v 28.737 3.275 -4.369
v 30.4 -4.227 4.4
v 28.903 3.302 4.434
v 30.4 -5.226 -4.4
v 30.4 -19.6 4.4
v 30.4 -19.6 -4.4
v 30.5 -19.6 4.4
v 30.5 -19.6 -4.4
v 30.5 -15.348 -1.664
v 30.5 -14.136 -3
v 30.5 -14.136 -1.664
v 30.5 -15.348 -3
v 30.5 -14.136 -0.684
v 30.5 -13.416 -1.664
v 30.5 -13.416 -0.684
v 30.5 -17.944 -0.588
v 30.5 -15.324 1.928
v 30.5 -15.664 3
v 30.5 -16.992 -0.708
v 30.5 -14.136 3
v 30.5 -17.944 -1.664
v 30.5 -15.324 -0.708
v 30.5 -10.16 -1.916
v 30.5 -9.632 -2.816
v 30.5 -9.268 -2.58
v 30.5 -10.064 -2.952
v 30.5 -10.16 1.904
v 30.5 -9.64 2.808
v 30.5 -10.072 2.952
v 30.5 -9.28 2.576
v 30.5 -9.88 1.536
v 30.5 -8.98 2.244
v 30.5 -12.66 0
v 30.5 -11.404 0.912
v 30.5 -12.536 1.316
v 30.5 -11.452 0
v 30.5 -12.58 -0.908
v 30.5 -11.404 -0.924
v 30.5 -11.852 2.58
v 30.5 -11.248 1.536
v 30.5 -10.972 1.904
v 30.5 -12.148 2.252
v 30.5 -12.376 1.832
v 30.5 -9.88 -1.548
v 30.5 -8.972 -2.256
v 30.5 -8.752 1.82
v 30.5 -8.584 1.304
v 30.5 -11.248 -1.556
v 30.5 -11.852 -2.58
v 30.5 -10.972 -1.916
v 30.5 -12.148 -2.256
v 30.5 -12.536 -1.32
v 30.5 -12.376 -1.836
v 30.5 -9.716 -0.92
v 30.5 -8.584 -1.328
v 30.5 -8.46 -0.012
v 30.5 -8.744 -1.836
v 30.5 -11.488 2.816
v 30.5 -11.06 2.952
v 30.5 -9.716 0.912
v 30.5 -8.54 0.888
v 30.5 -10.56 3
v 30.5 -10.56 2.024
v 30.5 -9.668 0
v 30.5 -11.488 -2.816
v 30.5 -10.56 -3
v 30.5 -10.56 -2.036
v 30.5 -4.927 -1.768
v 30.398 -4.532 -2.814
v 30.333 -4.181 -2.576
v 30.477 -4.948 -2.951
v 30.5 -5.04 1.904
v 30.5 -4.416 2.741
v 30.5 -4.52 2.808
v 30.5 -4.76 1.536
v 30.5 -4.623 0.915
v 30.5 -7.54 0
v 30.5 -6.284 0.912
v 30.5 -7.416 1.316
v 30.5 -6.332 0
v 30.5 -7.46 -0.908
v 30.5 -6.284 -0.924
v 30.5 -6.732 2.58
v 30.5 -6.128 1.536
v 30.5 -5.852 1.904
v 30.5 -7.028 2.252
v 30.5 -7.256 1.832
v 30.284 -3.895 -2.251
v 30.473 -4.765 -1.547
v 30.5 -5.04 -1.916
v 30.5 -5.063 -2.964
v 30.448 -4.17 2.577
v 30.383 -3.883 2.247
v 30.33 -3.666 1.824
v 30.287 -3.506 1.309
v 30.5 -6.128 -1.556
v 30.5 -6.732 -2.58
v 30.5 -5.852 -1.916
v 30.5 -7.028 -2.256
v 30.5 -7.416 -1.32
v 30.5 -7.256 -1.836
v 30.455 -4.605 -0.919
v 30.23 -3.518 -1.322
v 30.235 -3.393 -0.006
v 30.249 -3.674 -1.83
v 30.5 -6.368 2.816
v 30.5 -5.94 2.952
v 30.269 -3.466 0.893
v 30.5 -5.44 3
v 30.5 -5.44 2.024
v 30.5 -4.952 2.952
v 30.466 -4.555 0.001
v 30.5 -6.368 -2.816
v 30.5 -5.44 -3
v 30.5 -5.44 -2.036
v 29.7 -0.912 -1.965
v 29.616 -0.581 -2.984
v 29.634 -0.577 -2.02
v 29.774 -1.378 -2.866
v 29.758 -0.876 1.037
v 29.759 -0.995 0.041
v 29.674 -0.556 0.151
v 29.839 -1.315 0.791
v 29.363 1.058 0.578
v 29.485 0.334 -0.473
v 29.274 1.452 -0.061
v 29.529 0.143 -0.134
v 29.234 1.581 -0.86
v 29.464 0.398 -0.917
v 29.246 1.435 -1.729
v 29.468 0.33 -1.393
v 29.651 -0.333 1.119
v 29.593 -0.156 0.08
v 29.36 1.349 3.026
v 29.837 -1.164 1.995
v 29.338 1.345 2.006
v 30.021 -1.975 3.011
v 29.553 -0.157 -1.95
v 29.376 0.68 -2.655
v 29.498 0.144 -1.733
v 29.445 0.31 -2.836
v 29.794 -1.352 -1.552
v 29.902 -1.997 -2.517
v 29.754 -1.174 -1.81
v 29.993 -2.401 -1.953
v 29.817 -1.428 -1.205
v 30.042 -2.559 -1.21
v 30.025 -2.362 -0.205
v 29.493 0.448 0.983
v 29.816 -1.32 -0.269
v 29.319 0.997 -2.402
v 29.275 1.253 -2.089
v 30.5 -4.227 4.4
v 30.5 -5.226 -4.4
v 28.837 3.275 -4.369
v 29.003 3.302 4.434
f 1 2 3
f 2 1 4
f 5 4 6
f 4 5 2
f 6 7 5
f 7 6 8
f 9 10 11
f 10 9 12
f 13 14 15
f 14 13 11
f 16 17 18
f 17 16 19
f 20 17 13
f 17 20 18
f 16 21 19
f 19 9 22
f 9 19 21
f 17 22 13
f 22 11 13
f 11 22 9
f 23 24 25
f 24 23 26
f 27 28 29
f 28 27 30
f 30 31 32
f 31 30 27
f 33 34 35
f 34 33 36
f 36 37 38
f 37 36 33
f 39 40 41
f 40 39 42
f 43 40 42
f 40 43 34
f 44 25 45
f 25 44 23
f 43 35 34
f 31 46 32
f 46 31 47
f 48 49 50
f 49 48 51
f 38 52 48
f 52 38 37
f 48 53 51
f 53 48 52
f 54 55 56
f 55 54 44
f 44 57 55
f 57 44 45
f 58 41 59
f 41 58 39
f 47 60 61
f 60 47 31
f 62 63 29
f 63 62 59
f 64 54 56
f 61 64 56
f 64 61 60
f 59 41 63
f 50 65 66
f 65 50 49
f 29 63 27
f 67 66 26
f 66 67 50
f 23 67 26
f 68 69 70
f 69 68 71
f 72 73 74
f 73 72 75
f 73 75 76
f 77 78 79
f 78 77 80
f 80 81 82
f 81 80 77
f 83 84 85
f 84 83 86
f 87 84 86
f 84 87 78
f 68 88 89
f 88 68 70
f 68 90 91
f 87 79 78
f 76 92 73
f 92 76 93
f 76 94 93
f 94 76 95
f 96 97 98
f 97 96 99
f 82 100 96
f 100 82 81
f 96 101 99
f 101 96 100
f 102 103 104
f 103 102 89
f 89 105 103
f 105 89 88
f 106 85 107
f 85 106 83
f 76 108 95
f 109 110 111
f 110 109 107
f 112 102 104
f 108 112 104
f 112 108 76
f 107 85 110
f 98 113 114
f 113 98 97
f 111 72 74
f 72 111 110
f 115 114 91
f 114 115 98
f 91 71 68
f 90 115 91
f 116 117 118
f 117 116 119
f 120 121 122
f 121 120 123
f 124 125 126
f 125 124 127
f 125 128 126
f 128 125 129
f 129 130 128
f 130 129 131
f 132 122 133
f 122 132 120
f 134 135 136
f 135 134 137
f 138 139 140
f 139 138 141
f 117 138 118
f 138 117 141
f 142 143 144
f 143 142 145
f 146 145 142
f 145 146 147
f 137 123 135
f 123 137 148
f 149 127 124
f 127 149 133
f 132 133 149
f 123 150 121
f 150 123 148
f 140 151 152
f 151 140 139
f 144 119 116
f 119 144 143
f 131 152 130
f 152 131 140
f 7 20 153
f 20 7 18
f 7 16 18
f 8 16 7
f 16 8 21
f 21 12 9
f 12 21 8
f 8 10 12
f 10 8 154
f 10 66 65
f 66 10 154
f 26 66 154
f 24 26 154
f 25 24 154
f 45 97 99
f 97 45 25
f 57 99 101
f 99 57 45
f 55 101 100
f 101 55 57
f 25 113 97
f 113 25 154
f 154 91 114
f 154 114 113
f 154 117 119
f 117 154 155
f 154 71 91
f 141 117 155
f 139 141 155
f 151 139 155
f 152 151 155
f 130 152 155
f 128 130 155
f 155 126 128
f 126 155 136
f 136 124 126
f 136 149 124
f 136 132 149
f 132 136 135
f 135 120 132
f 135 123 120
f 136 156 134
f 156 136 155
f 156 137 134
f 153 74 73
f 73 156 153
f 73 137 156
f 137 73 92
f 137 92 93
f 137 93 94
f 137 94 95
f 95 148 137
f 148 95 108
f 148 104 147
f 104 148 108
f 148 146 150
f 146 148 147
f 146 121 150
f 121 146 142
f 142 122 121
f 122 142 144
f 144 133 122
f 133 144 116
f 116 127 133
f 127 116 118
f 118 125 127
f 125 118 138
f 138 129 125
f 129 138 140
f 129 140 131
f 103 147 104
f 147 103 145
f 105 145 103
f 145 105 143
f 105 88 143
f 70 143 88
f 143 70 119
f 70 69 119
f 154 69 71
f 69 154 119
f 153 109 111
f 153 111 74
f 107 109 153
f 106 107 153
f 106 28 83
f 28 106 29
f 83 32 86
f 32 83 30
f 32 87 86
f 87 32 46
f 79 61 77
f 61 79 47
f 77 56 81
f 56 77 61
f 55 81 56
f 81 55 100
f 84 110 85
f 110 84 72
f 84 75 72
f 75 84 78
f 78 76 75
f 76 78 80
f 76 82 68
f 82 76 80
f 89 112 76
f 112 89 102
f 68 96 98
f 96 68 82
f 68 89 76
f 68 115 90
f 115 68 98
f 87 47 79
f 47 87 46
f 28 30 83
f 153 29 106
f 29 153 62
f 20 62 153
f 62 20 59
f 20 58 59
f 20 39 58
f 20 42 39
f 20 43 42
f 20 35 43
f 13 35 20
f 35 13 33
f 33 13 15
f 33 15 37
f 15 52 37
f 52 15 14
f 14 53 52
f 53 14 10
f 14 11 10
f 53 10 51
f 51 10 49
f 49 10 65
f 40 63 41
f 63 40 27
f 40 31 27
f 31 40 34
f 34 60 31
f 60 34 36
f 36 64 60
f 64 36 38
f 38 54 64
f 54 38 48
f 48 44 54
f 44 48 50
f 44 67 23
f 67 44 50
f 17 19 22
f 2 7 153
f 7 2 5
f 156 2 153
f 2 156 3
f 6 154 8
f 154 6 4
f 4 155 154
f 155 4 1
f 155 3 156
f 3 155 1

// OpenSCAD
use <../lib.scad>
function ldraw_lib__194175bc01() = [
// 0 Sticker  1.1 x  2.9 with White "4005" on Transparent Background (Formed for Boat Stern Left Side)
// 0 Name: 194175bc01.dat
// 0 Author: Takeshi Takahashi [RainbowDolphin]
// 0 !LDRAW_ORG Part UPDATE 2022-06
// 0 !LICENSE Licensed under CC BY 2.0 and CC BY 4.0 : see CAreadme.txt
// 
// 0 BFC CERTIFY CCW
  [0,"BFC","CERTIFY"],
  [0,"BFC","CCW"],
// 
// 0 !KEYWORDS Bricklink 4005stk01, Brickowl 946320, Rebrickable 194175, Set 4005
// 0 !KEYWORDS Tug boat
// 
// 0 !HISTORY 2022-12-20 [PTadmin] Official Update 2022-06
// 
// 
// 4 16 71.8435 10.9226 8.188 76 11 -13.0658 76 -11 -10.5677 72.2585 -11.0845 8.256
  [4,16,71.8435,10.9226,8.188,76,11,-13.0658,76,-11,-10.5677,72.2585,-11.0845,8.256],
// 4 16 76 -11 -49 76 -11 -10.5677 76 11 -13.0658 76 11 -49
  [4,16,76,-11,-49,76,-11,-10.5677,76,11,-13.0658,76,11,-49],
// 4 16 76.25 11 -49 76.25 -11 -49 76 -11 -49 76 11 -49
  [4,16,76.25,11,-49,76.25,-11,-49,76,-11,-49,76,11,-49],
// 0 BFC NOCLIP
  [0,"BFC","NOCLIP"],
// 4 15 76.25 7.5 -38.37 76.25 7.5 -35.34 76.25 4.16 -35.34 76.25 4.16 -38.37
  [4,15,76.25,7.5,-38.37,76.25,7.5,-35.34,76.25,4.16,-35.34,76.25,4.16,-38.37],
// 4 15 76.25 1.71 -35.34 76.25 4.16 -35.34 76.25 4.16 -33.54 76.25 1.71 -33.54
  [4,15,76.25,1.71,-35.34,76.25,4.16,-35.34,76.25,4.16,-33.54,76.25,1.71,-33.54],
// 4 15 76.25 1.77 -42.48 76.25 -4.82 -38.31 76.25 -7.5 -39.16 76.25 1.47 -44.86
  [4,15,76.25,1.77,-42.48,76.25,-4.82,-38.31,76.25,-7.5,-39.16,76.25,1.47,-44.86],
// 4 15 76.25 -7.5 -35.34 76.25 -7.5 -39.16 76.25 -4.82 -38.31 76.25 1.71 -35.34
  [4,15,76.25,-7.5,-35.34,76.25,-7.5,-39.16,76.25,-4.82,-38.31,76.25,1.71,-35.34],
// 3 15 76.25 1.47 -44.86 76.25 4.16 -44.86 76.25 1.77 -42.48
  [3,15,76.25,1.47,-44.86,76.25,4.16,-44.86,76.25,1.77,-42.48],
// 4 15 76.25 1.77 -38.31 76.25 1.77 -42.48 76.25 4.16 -44.86 76.25 4.16 -38.37
  [4,15,76.25,1.77,-38.31,76.25,1.77,-42.48,76.25,4.16,-44.86,76.25,4.16,-38.37],
// 3 15 76.25 -4.82 -38.31 76.25 1.77 -38.31 76.25 1.71 -35.34
  [3,15,76.25,-4.82,-38.31,76.25,1.77,-38.31,76.25,1.71,-35.34],
// 4 15 76.25 4.16 -38.37 76.25 4.16 -35.34 76.25 1.71 -35.34 76.25 1.77 -38.31
  [4,15,76.25,4.16,-38.37,76.25,4.16,-35.34,76.25,1.71,-35.34,76.25,1.77,-38.31],
// 4 15 76.25 6.45 -23.17 76.25 4.79 -25.4 76.25 7.38 -25.16 76.25 7.04 -24.08
  [4,15,76.25,6.45,-23.17,76.25,4.79,-25.4,76.25,7.38,-25.16,76.25,7.04,-24.08],
// 4 15 76.25 -7.38 -25.18 76.25 -4.76 -25.4 76.25 -6.44 -23.2 76.25 -7.02 -24.1
  [4,15,76.25,-7.38,-25.18,76.25,-4.76,-25.4,76.25,-6.44,-23.2,76.25,-7.02,-24.1],
// 4 15 76.25 -5.61 -22.45 76.25 -6.44 -23.2 76.25 -4.76 -25.4 76.25 -3.84 -24.7
  [4,15,76.25,-5.61,-22.45,76.25,-6.44,-23.2,76.25,-4.76,-25.4,76.25,-3.84,-24.7],
// 4 15 76.25 -3.29 -31.34 76.25 0 -31.65 76.25 0 -28.63 76.25 -2.28 -28.51
  [4,15,76.25,-3.29,-31.34,76.25,0,-31.65,76.25,0,-28.63,76.25,-2.28,-28.51],
// 4 15 76.25 0 -31.65 76.25 2.27 -31.45 76.25 2.31 -28.51 76.25 0 -28.63
  [4,15,76.25,0,-31.65,76.25,2.27,-31.45,76.25,2.31,-28.51,76.25,0,-28.63],
// 4 15 76.25 -4.76 -27.43 76.25 -6.45 -29.63 76.25 -5.63 -30.37 76.25 -3.84 -28.119
  [4,15,76.25,-4.76,-27.43,76.25,-6.45,-29.63,76.25,-5.63,-30.37,76.25,-3.84,-28.119],
// 4 15 76.25 -3.84 -28.119 76.25 -5.63 -30.37 76.25 -4.58 -30.94 76.25 -2.28 -28.51
  [4,15,76.25,-3.84,-28.119,76.25,-5.63,-30.37,76.25,-4.58,-30.94,76.25,-2.28,-28.51],
// 4 15 76.25 4.79 -25.4 76.25 6.45 -23.17 76.25 5.64 -22.43 76.25 3.87 -24.7
  [4,15,76.25,4.79,-25.4,76.25,6.45,-23.17,76.25,5.64,-22.43,76.25,3.87,-24.7],
// 3 15 76.25 -4.58 -30.94 76.25 -3.29 -31.34 76.25 -2.28 -28.51
  [3,15,76.25,-4.58,-30.94,76.25,-3.29,-31.34,76.25,-2.28,-28.51],
// 4 15 76.25 -3.26 -21.46 76.25 -4.55 -21.88 76.25 -5.61 -22.45 76.25 -3.84 -24.7
  [4,15,76.25,-3.26,-21.46,76.25,-4.55,-21.88,76.25,-5.61,-22.45,76.25,-3.84,-24.7],
// 4 15 76.25 4.79 -27.43 76.25 3.89 -28.119 76.25 5.64 -30.37 76.25 6.45 -29.63
  [4,15,76.25,4.79,-27.43,76.25,3.89,-28.119,76.25,5.64,-30.37,76.25,6.45,-29.63],
// 4 15 76.25 2.27 -31.45 76.25 3.3 -31.34 76.25 3.89 -28.119 76.25 2.31 -28.51
  [4,15,76.25,2.27,-31.45,76.25,3.3,-31.34,76.25,3.89,-28.119,76.25,2.31,-28.51],
// 4 15 76.25 3.3 -31.34 76.25 4.59 -30.94 76.25 5.64 -30.37 76.25 3.89 -28.119
  [4,15,76.25,3.3,-31.34,76.25,4.59,-30.94,76.25,5.64,-30.37,76.25,3.89,-28.119],
// 4 15 76.25 .03 -21.15 76.25 2.3 -24.29 76.25 3.87 -24.7 76.25 3.32 -21.46
  [4,15,76.25,.03,-21.15,76.25,2.3,-24.29,76.25,3.87,-24.7,76.25,3.32,-21.46],
// 4 15 76.25 5.64 -22.43 76.25 4.59 -21.86 76.25 3.32 -21.46 76.25 3.87 -24.7
  [4,15,76.25,5.64,-22.43,76.25,4.59,-21.86,76.25,3.32,-21.46,76.25,3.87,-24.7],
// 4 15 76.25 -6.45 -29.63 76.25 -4.76 -27.43 76.25 -7.38 -27.65 76.25 -7.04 -28.72
  [4,15,76.25,-6.45,-29.63,76.25,-4.76,-27.43,76.25,-7.38,-27.65,76.25,-7.04,-28.72],
// 4 15 76.25 -3.84 -24.7 76.25 -2.28 -24.29 76.25 -2.22 -21.35 76.25 -3.26 -21.46
  [4,15,76.25,-3.84,-24.7,76.25,-2.28,-24.29,76.25,-2.22,-21.35,76.25,-3.26,-21.46],
// 4 15 76.25 -7.38 -25.18 76.25 -7.5 -26.4 76.25 -7.38 -27.65 76.25 -5.06 -26.4
  [4,15,76.25,-7.38,-25.18,76.25,-7.5,-26.4,76.25,-7.38,-27.65,76.25,-5.06,-26.4],
// 3 15 76.25 0 -24.17 76.25 2.3 -24.29 76.25 .03 -21.15
  [3,15,76.25,0,-24.17,76.25,2.3,-24.29,76.25,.03,-21.15],
// 4 15 76.25 -2.28 -24.29 76.25 0 -24.17 76.25 .03 -21.15 76.25 -2.22 -21.35
  [4,15,76.25,-2.28,-24.29,76.25,0,-24.17,76.25,.03,-21.15,76.25,-2.22,-21.35],
// 3 15 76.25 -7.38 -27.65 76.25 -4.76 -27.43 76.25 -5.06 -26.4
  [3,15,76.25,-7.38,-27.65,76.25,-4.76,-27.43,76.25,-5.06,-26.4],
// 4 15 76.25 6.45 -29.63 76.25 7.04 -28.72 76.25 7.5 -26.4 76.25 4.79 -27.43
  [4,15,76.25,6.45,-29.63,76.25,7.04,-28.72,76.25,7.5,-26.4,76.25,4.79,-27.43],
// 3 15 76.25 -7.38 -25.18 76.25 -5.06 -26.4 76.25 -4.76 -25.4
  [3,15,76.25,-7.38,-25.18,76.25,-5.06,-26.4,76.25,-4.76,-25.4],
// 4 15 76.25 4.79 -27.43 76.25 7.5 -26.4 76.25 7.38 -25.16 76.25 5.09 -26.4
  [4,15,76.25,4.79,-27.43,76.25,7.5,-26.4,76.25,7.38,-25.16,76.25,5.09,-26.4],
// 3 15 76.25 4.79 -25.4 76.25 5.09 -26.4 76.25 7.38 -25.16
  [3,15,76.25,4.79,-25.4,76.25,5.09,-26.4,76.25,7.38,-25.16],
// 4 15 75.8333 6.4406 -10.4529 76.25 4.4203 -12.3187 76.1936 7.3787 -12.3712 75.9945 7.0342 -11.3308
  [4,15,75.8333,6.4406,-10.4529,76.25,4.4203,-12.3187,76.1936,7.3787,-12.3712,75.9945,7.0342,-11.3308],
// 4 15 76.25 -7.02 -11.3 76.25 -4.76 -12.6 76.25 -3.84 -11.9 76.25 -6.8517 -11.0388
  [4,15,76.25,-7.02,-11.3,76.25,-4.76,-12.6,76.25,-3.84,-11.9,76.25,-6.8517,-11.0388],
// 3 15 76.25 -6.8517 -11.0388 76.25 -3.84 -11.9 76.25 -2.2876 -11.557
  [3,15,76.25,-6.8517,-11.0388,76.25,-3.84,-11.9,76.25,-2.2876,-11.557],
// 4 15 76.25 -3.29 -18.54 76.25 0 -18.85 76.25 0 -15.83 76.25 -2.28 -15.71
  [4,15,76.25,-3.29,-18.54,76.25,0,-18.85,76.25,0,-15.83,76.25,-2.28,-15.71],
// 4 15 76.25 0 -18.85 76.25 2.27 -18.65 76.25 2.31 -15.71 76.25 0 -15.83
  [4,15,76.25,0,-18.85,76.25,2.27,-18.65,76.25,2.31,-15.71,76.25,0,-15.83],
// 4 15 76.25 -4.76 -14.63 76.25 -6.45 -16.83 76.25 -5.63 -17.57 76.25 -3.84 -15.32
  [4,15,76.25,-4.76,-14.63,76.25,-6.45,-16.83,76.25,-5.63,-17.57,76.25,-3.84,-15.32],
// 4 15 76.25 -3.84 -15.32 76.25 -5.63 -17.57 76.25 -4.58 -18.14 76.25 -2.28 -15.71
  [4,15,76.25,-3.84,-15.32,76.25,-5.63,-17.57,76.25,-4.58,-18.14,76.25,-2.28,-15.71],
// 4 15 76.1819 3.8685 -11.9135 76.25 4.4203 -12.3187 75.8333 6.4406 -10.4529 75.7094 5.6278 -9.7375
  [4,15,76.1819,3.8685,-11.9135,76.25,4.4203,-12.3187,75.8333,6.4406,-10.4529,75.7094,5.6278,-9.7375],
// 3 15 76.25 4.4203 -12.3187 76.25 4.79 -12.6 76.25 7.4088 -12.6581
  [3,15,76.25,4.4203,-12.3187,76.25,4.79,-12.6,76.25,7.4088,-12.6581],
// 3 15 76.25 -4.58 -18.14 76.25 -3.29 -18.54 76.25 -2.28 -15.71
  [3,15,76.25,-4.58,-18.14,76.25,-3.29,-18.54,76.25,-2.28,-15.71],
// 4 15 76.25 -6.8517 -11.0388 76.25 -2.2876 -11.557 75.9575 -5.6166 -9.7082 76.1189 -6.443 -10.4261
  [4,15,76.25,-6.8517,-11.0388,76.25,-2.2876,-11.557,75.9575,-5.6166,-9.7082,76.1189,-6.443,-10.4261],
// 4 15 75.7172 -3.272 -8.766 75.8255 -4.5596 -9.1644 75.9575 -5.6166 -9.7082 76.25 -2.2876 -11.557
  [4,15,75.7172,-3.272,-8.766,75.8255,-4.5596,-9.1644,75.9575,-5.6166,-9.7082,76.25,-2.2876,-11.557],
// 4 15 76.25 4.79 -14.63 76.25 3.89 -15.32 76.25 5.64 -17.57 76.25 6.45 -16.83
  [4,15,76.25,4.79,-14.63,76.25,3.89,-15.32,76.25,5.64,-17.57,76.25,6.45,-16.83],
// 4 15 76.25 2.27 -18.65 76.25 3.3 -18.54 76.25 3.89 -15.32 76.25 2.31 -15.71
  [4,15,76.25,2.27,-18.65,76.25,3.3,-18.54,76.25,3.89,-15.32,76.25,2.31,-15.71],
// 4 15 76.25 3.3 -18.54 76.25 4.59 -18.14 76.25 5.64 -17.57 76.25 3.89 -15.32
  [4,15,76.25,3.3,-18.54,76.25,4.59,-18.14,76.25,5.64,-17.57,76.25,3.89,-15.32],
// 4 15 75.5865 .015 -8.482 76.1376 2.2975 -11.5124 76.1819 3.8685 -11.9135 75.5743 3.3047 -8.7944
  [4,15,75.5865,.015,-8.482,76.1376,2.2975,-11.5124,76.1819,3.8685,-11.9135,75.5743,3.3047,-8.7944],
// 4 15 75.7094 5.6278 -9.7375 75.6232 4.5758 -9.1846 75.5743 3.3047 -8.7944 76.1819 3.8685 -11.9135
  [4,15,75.7094,5.6278,-9.7375,75.6232,4.5758,-9.1846,75.5743,3.3047,-8.7944,76.1819,3.8685,-11.9135],
// 4 15 76.25 -6.45 -16.83 76.25 -4.76 -14.63 76.25 -7.38 -14.85 76.25 -7.04 -15.92
  [4,15,76.25,-6.45,-16.83,76.25,-4.76,-14.63,76.25,-7.38,-14.85,76.25,-7.04,-15.92],
// 3 15 76.25 -2.2876 -11.557 75.6736 -2.233 -8.6646 75.7172 -3.272 -8.766
  [3,15,76.25,-2.2876,-11.557,75.6736,-2.233,-8.6646,75.7172,-3.272,-8.766],
// 4 15 76.25 -7.38 -12.38 76.25 -7.5 -13.6 76.25 -7.38 -14.85 76.25 -5.06 -13.6
  [4,15,76.25,-7.38,-12.38,76.25,-7.5,-13.6,76.25,-7.38,-14.85,76.25,-5.06,-13.6],
// 3 15 76.1646 -.0019 -11.387 76.1376 2.2975 -11.5124 75.5865 .015 -8.482
  [3,15,76.1646,-.0019,-11.387,76.1376,2.2975,-11.5124,75.5865,.015,-8.482],
// 4 15 76.25 -2.2876 -11.557 76.1646 -.0019 -11.387 75.5865 .015 -8.482 75.6736 -2.233 -8.6646
  [4,15,76.25,-2.2876,-11.557,76.1646,-.0019,-11.387,75.5865,.015,-8.482,75.6736,-2.233,-8.6646],
// 3 15 76.25 -7.38 -14.85 76.25 -4.76 -14.63 76.25 -5.06 -13.6
  [3,15,76.25,-7.38,-14.85,76.25,-4.76,-14.63,76.25,-5.06,-13.6],
// 4 15 76.25 6.45 -16.83 76.25 7.04 -15.92 76.25 7.5 -13.6 76.25 4.79 -14.63
  [4,15,76.25,6.45,-16.83,76.25,7.04,-15.92,76.25,7.5,-13.6,76.25,4.79,-14.63],
// 4 15 76.25 -7.02 -11.3 76.25 -7.38 -12.38 76.25 -5.06 -13.6 76.25 -4.76 -12.6
  [4,15,76.25,-7.02,-11.3,76.25,-7.38,-12.38,76.25,-5.06,-13.6,76.25,-4.76,-12.6],
// 4 15 76.25 5.09 -13.6 76.25 4.79 -14.63 76.25 7.5 -13.6 76.25 7.4088 -12.6581
  [4,15,76.25,5.09,-13.6,76.25,4.79,-14.63,76.25,7.5,-13.6,76.25,7.4088,-12.6581],
// 3 15 76.25 7.4088 -12.6581 76.1936 7.3787 -12.3712 76.25 4.4203 -12.3187
  [3,15,76.25,7.4088,-12.6581,76.1936,7.3787,-12.3712,76.25,4.4203,-12.3187],
// 3 15 76.25 4.79 -12.6 76.25 5.09 -13.6 76.25 7.4088 -12.6581
  [3,15,76.25,4.79,-12.6,76.25,5.09,-13.6,76.25,7.4088,-12.6581],
// 4 15 74.4358 7.1662 -3.4444 74.041 7.4589 -1.4515 74.0842 5.0497 -1.4431 74.2504 4.9128 -2.2806
  [4,15,74.4358,7.1662,-3.4444,74.041,7.4589,-1.4515,74.0842,5.0497,-1.4431,74.2504,4.9128,-2.2806],
// 4 15 74.5986 -1.9773 -3.2884 74.3972 -.1018 -2.4885 74.1851 -.3766 -1.3906 74.3939 -2.5919 -2.1891
  [4,15,74.5986,-1.9773,-3.2884,74.3972,-.1018,-2.4885,74.1851,-.3766,-1.3906,74.3939,-2.5919,-2.1891],
// 4 15 73.8215 .3352 .3571 73.7114 1.1827 .8341 73.1842 .1529 3.6311 73.4068 -1.4442 2.6446
  [4,15,73.8215,.3352,.3571,73.7114,1.1827,.8341,73.1842,.1529,3.6311,73.4068,-1.4442,2.6446],
// 4 15 73.1842 .1529 3.6311 73.7114 1.1827 .8341 73.6595 2.2918 .994 73.0843 2.1511 3.9516
  [4,15,73.1842,.1529,3.6311,73.7114,1.1827,.8341,73.6595,2.2918,.994,73.0843,2.1511,3.9516],
// 4 15 73.6701 3.482 .826 73.115 4.3216 3.5876 73.0843 2.1511 3.9516 73.6595 2.2918 .994
  [4,15,73.6701,3.482,.826,73.115,4.3216,3.5876,73.0843,2.1511,3.9516,73.6595,2.2918,.994],
// 4 15 74.3939 -2.5919 -2.1891 74.1851 -.3766 -1.3906 73.9823 -.2012 -.391 74.1287 -2.7979 -.8319
  [4,15,74.3939,-2.5919,-2.1891,74.1851,-.3766,-1.3906,73.9823,-.2012,-.391,74.1287,-2.7979,-.8319],
// 4 15 75.0521 -7.5271 -4.9382 74.5913 -4.9875 -2.9099 73.3447 -5.0156 3.3622 73.4 -7.5644 3.3732
  [4,15,75.0521,-7.5271,-4.9382,74.5913,-4.9875,-2.9099,73.3447,-5.0156,3.3622,73.4,-7.5644,3.3732],
// 4 15 73.4404 6.6377 1.7012 73.7452 4.3334 .3607 73.8822 4.8759 -.3925 73.613 7.0909 .7749
  [4,15,73.4404,6.6377,1.7012,73.7452,4.3334,.3607,73.8822,4.8759,-.3925,73.613,7.0909,.7749],
// 4 15 74.0842 5.0497 -1.4431 74.041 7.4589 -1.4515 73.613 7.0909 .7749 73.8822 4.8759 -.3925
  [4,15,74.0842,5.0497,-1.4431,74.041,7.4589,-1.4515,73.613,7.0909,.7749,73.8822,4.8759,-.3925],
// 4 15 74.3853 4.5253 -2.9343 74.4848 3.8801 -3.381 74.9834 4.8814 -6.0019 74.7544 6.2922 -4.9922
  [4,15,74.3853,4.5253,-2.9343,74.4848,3.8801,-3.381,74.9834,4.8814,-6.0019,74.7544,6.2922,-4.9922],
// 4 15 75.1041 3.0241 -6.3979 74.9834 4.8814 -6.0019 74.4848 3.8801 -3.381 74.5419 3.0114 -3.5697
  [4,15,75.1041,3.0241,-6.3979,74.9834,4.8814,-6.0019,74.4848,3.8801,-3.381,74.5419,3.0114,-3.5697],
// 4 15 74.5913 -4.9875 -2.9099 75.0521 -7.5271 -4.9382 75.063 .5132 -5.9061 74.5986 -1.9773 -3.2884
  [4,15,74.5913,-4.9875,-2.9099,75.0521,-7.5271,-4.9382,75.063,.5132,-5.9061,74.5986,-1.9773,-3.2884],
// 4 15 73.4068 -1.4442 2.6446 73.7329 -2.4568 1.1194 73.9823 -.2012 -.391 73.8215 .3352 .3571
  [4,15,73.4068,-1.4442,2.6446,73.7329,-2.4568,1.1194,73.9823,-.2012,-.391,73.8215,.3352,.3571],
// 3 15 74.1287 -2.7979 -.8319 73.9823 -.2012 -.391 73.7329 -2.4568 1.1194
  [3,15,74.1287,-2.7979,-.8319,73.9823,-.2012,-.391,73.7329,-2.4568,1.1194],
// 4 15 75.063 .5132 -5.9061 74.5411 .6714 -3.2998 74.3972 -.1018 -2.4885 74.5986 -1.9773 -3.2884
  [4,15,75.063,.5132,-5.9061,74.5411,.6714,-3.2998,74.3972,-.1018,-2.4885,74.5986,-1.9773,-3.2884],
// 4 15 73.1873 5.223 3.1317 73.7452 4.3334 .3607 73.4404 6.6377 1.7012 73.2975 6.005 2.4932
  [4,15,73.1873,5.223,3.1317,73.7452,4.3334,.3607,73.4404,6.6377,1.7012,73.2975,6.005,2.4932],
// 4 15 74.7544 6.2922 -4.9922 74.4358 7.1662 -3.4444 74.2504 4.9128 -2.2806 74.3853 4.5253 -2.9343
  [4,15,74.7544,6.2922,-4.9922,74.4358,7.1662,-3.4444,74.2504,4.9128,-2.2806,74.3853,4.5253,-2.9343],
// 4 15 73.115 4.3216 3.5876 73.6701 3.482 .826 73.7452 4.3334 .3607 73.1873 5.223 3.1317
  [4,15,73.115,4.3216,3.5876,73.6701,3.482,.826,73.7452,4.3334,.3607,73.1873,5.223,3.1317],
// 0 BFC CLIP
  [0,"BFC","CLIP"],
// 4 16 76.25 -7.5 -35.34 76.25 -11 -10.5677 76.25 -11 -49 76.25 -7.5 -39.16
  [4,16,76.25,-7.5,-35.34,76.25,-11,-10.5677,76.25,-11,-49,76.25,-7.5,-39.16],
// 3 16 76.25 -11 -49 76.25 1.47 -44.86 76.25 -7.5 -39.16
  [3,16,76.25,-11,-49,76.25,1.47,-44.86,76.25,-7.5,-39.16],
// 4 16 76.25 1.47 -44.86 76.25 -11 -49 76.25 11 -49 76.25 4.16 -44.86
  [4,16,76.25,1.47,-44.86,76.25,-11,-49,76.25,11,-49,76.25,4.16,-44.86],
// 4 16 76.25 4.16 -38.37 76.25 4.16 -44.86 76.25 11 -49 76.25 7.5 -38.37
  [4,16,76.25,4.16,-38.37,76.25,4.16,-44.86,76.25,11,-49,76.25,7.5,-38.37],
// 4 16 76.25 7.5 -35.34 76.25 7.5 -38.37 76.25 11 -49 76.25 11 -13.0658
  [4,16,76.25,7.5,-35.34,76.25,7.5,-38.37,76.25,11,-49,76.25,11,-13.0658],
// 4 16 76.25 7.5 -35.34 76.25 11 -13.0658 76.25 7.5 -26.4 76.25 7.04 -28.72
  [4,16,76.25,7.5,-35.34,76.25,11,-13.0658,76.25,7.5,-26.4,76.25,7.04,-28.72],
// 3 16 76.25 7.38 -25.16 76.25 7.5 -26.4 76.25 11 -13.0658
  [3,16,76.25,7.38,-25.16,76.25,7.5,-26.4,76.25,11,-13.0658],
// 3 16 76.25 7.04 -24.08 76.25 7.38 -25.16 76.25 11 -13.0658
  [3,16,76.25,7.04,-24.08,76.25,7.38,-25.16,76.25,11,-13.0658],
// 3 16 76.25 6.45 -23.17 76.25 7.04 -24.08 76.25 11 -13.0658
  [3,16,76.25,6.45,-23.17,76.25,7.04,-24.08,76.25,11,-13.0658],
// 4 16 76.25 6.45 -16.83 76.25 5.64 -17.57 76.25 5.64 -22.43 76.25 6.45 -23.17
  [4,16,76.25,6.45,-16.83,76.25,5.64,-17.57,76.25,5.64,-22.43,76.25,6.45,-23.17],
// 4 16 76.25 5.64 -17.57 76.25 4.59 -18.14 76.25 4.59 -21.86 76.25 5.64 -22.43
  [4,16,76.25,5.64,-17.57,76.25,4.59,-18.14,76.25,4.59,-21.86,76.25,5.64,-22.43],
// 4 16 76.25 3.32 -21.46 76.25 4.59 -21.86 76.25 4.59 -18.14 76.25 3.3 -18.54
  [4,16,76.25,3.32,-21.46,76.25,4.59,-21.86,76.25,4.59,-18.14,76.25,3.3,-18.54],
// 4 16 76.25 6.45 -23.17 76.25 11 -13.0658 76.25 7.04 -15.92 76.25 6.45 -16.83
  [4,16,76.25,6.45,-23.17,76.25,11,-13.0658,76.25,7.04,-15.92,76.25,6.45,-16.83],
// 3 16 76.25 11 -13.0658 76.25 7.4088 -12.6581 76.25 7.5 -13.6
  [3,16,76.25,11,-13.0658,76.25,7.4088,-12.6581,76.25,7.5,-13.6],
// 3 16 76.25 11 -13.0658 76.25 7.5 -13.6 76.25 7.04 -15.92
  [3,16,76.25,11,-13.0658,76.25,7.5,-13.6,76.25,7.04,-15.92],
// 4 16 72.0935 10.9226 8.188 74.041 7.4589 -1.4515 74.4358 7.1662 -3.4444 76.25 11 -13.0658
  [4,16,72.0935,10.9226,8.188,74.041,7.4589,-1.4515,74.4358,7.1662,-3.4444,76.25,11,-13.0658],
// 3 16 76.25 11 -13.0658 76.1936 7.3787 -12.3712 76.25 7.4088 -12.6581
  [3,16,76.25,11,-13.0658,76.1936,7.3787,-12.3712,76.25,7.4088,-12.6581],
// 3 16 73.613 7.0909 .7749 74.041 7.4589 -1.4515 72.0935 10.9226 8.188
  [3,16,73.613,7.0909,.7749,74.041,7.4589,-1.4515,72.0935,10.9226,8.188],
// 3 16 73.4404 6.6377 1.7012 73.613 7.0909 .7749 72.0935 10.9226 8.188
  [3,16,73.4404,6.6377,1.7012,73.613,7.0909,.7749,72.0935,10.9226,8.188],
// 3 16 73.2975 6.005 2.4932 73.4404 6.6377 1.7012 72.0935 10.9226 8.188
  [3,16,73.2975,6.005,2.4932,73.4404,6.6377,1.7012,72.0935,10.9226,8.188],
// 3 16 73.1873 5.223 3.1317 73.2975 6.005 2.4932 72.0935 10.9226 8.188
  [3,16,73.1873,5.223,3.1317,73.2975,6.005,2.4932,72.0935,10.9226,8.188],
// 3 16 73.115 4.3216 3.5876 73.1873 5.223 3.1317 72.0935 10.9226 8.188
  [3,16,73.115,4.3216,3.5876,73.1873,5.223,3.1317,72.0935,10.9226,8.188],
// 3 16 73.0843 2.1511 3.9516 73.115 4.3216 3.5876 72.0935 10.9226 8.188
  [3,16,73.0843,2.1511,3.9516,73.115,4.3216,3.5876,72.0935,10.9226,8.188],
// 4 16 73.1842 .1529 3.6311 73.0843 2.1511 3.9516 72.0935 10.9226 8.188 73.3447 -5.0156 3.3622
  [4,16,73.1842,.1529,3.6311,73.0843,2.1511,3.9516,72.0935,10.9226,8.188,73.3447,-5.0156,3.3622],
// 3 16 73.3447 -5.0156 3.3622 73.4068 -1.4442 2.6446 73.1842 .1529 3.6311
  [3,16,73.3447,-5.0156,3.3622,73.4068,-1.4442,2.6446,73.1842,.1529,3.6311],
// 3 16 73.3447 -5.0156 3.3622 73.7329 -2.4568 1.1194 73.4068 -1.4442 2.6446
  [3,16,73.3447,-5.0156,3.3622,73.7329,-2.4568,1.1194,73.4068,-1.4442,2.6446],
// 4 16 74.1287 -2.7979 -.8319 73.7329 -2.4568 1.1194 73.3447 -5.0156 3.3622 74.5913 -4.9875 -2.9099
  [4,16,74.1287,-2.7979,-.8319,73.7329,-2.4568,1.1194,73.3447,-5.0156,3.3622,74.5913,-4.9875,-2.9099],
// 3 16 74.5913 -4.9875 -2.9099 74.3939 -2.5919 -2.1891 74.1287 -2.7979 -.8319
  [3,16,74.5913,-4.9875,-2.9099,74.3939,-2.5919,-2.1891,74.1287,-2.7979,-.8319],
// 3 16 74.5913 -4.9875 -2.9099 74.5986 -1.9773 -3.2884 74.3939 -2.5919 -2.1891
  [3,16,74.5913,-4.9875,-2.9099,74.5986,-1.9773,-3.2884,74.3939,-2.5919,-2.1891],
// 4 16 73.3447 -5.0156 3.3622 72.0935 10.9226 8.188 72.5085 -11.0845 8.256 73.4 -7.5644 3.3732
  [4,16,73.3447,-5.0156,3.3622,72.0935,10.9226,8.188,72.5085,-11.0845,8.256,73.4,-7.5644,3.3732],
// 3 16 72.5085 -11.0845 8.256 75.0521 -7.5271 -4.9382 73.4 -7.5644 3.3732
  [3,16,72.5085,-11.0845,8.256,75.0521,-7.5271,-4.9382,73.4,-7.5644,3.3732],
// 3 16 76.25 -11 -10.5677 76.25 -7.02 -11.3 76.25 -6.8517 -11.0388
  [3,16,76.25,-11,-10.5677,76.25,-7.02,-11.3,76.25,-6.8517,-11.0388],
// 3 16 76.25 -6.8517 -11.0388 72.5085 -11.0845 8.256 76.25 -11 -10.5677
  [3,16,76.25,-6.8517,-11.0388,72.5085,-11.0845,8.256,76.25,-11,-10.5677],
// 4 16 76.1189 -6.443 -10.4261 75.0521 -7.5271 -4.9382 72.5085 -11.0845 8.256 76.25 -6.8517 -11.0388
  [4,16,76.1189,-6.443,-10.4261,75.0521,-7.5271,-4.9382,72.5085,-11.0845,8.256,76.25,-6.8517,-11.0388],
// 3 16 75.0521 -7.5271 -4.9382 76.1189 -6.443 -10.4261 75.9575 -5.6166 -9.7082
  [3,16,75.0521,-7.5271,-4.9382,76.1189,-6.443,-10.4261,75.9575,-5.6166,-9.7082],
// 3 16 75.0521 -7.5271 -4.9382 75.9575 -5.6166 -9.7082 75.8255 -4.5596 -9.1644
  [3,16,75.0521,-7.5271,-4.9382,75.9575,-5.6166,-9.7082,75.8255,-4.5596,-9.1644],
// 3 16 75.0521 -7.5271 -4.9382 75.8255 -4.5596 -9.1644 75.7172 -3.272 -8.766
  [3,16,75.0521,-7.5271,-4.9382,75.8255,-4.5596,-9.1644,75.7172,-3.272,-8.766],
// 4 16 75.0521 -7.5271 -4.9382 75.7172 -3.272 -8.766 75.6736 -2.233 -8.6646 75.063 .5132 -5.9061
  [4,16,75.0521,-7.5271,-4.9382,75.7172,-3.272,-8.766,75.6736,-2.233,-8.6646,75.063,.5132,-5.9061],
// 4 16 75.063 .5132 -5.9061 75.6736 -2.233 -8.6646 75.5865 .015 -8.482 75.1041 3.0241 -6.3979
  [4,16,75.063,.5132,-5.9061,75.6736,-2.233,-8.6646,75.5865,.015,-8.482,75.1041,3.0241,-6.3979],
// 4 16 74.5411 .6714 -3.2998 75.063 .5132 -5.9061 75.1041 3.0241 -6.3979 74.5419 3.0114 -3.5697
  [4,16,74.5411,.6714,-3.2998,75.063,.5132,-5.9061,75.1041,3.0241,-6.3979,74.5419,3.0114,-3.5697],
// 4 16 74.3972 -.1018 -2.4885 74.5411 .6714 -3.2998 74.5419 3.0114 -3.5697 74.4848 3.8801 -3.381
  [4,16,74.3972,-.1018,-2.4885,74.5411,.6714,-3.2998,74.5419,3.0114,-3.5697,74.4848,3.8801,-3.381],
// 4 16 74.1851 -.3766 -1.3906 74.3972 -.1018 -2.4885 74.4848 3.8801 -3.381 74.3853 4.5253 -2.9343
  [4,16,74.1851,-.3766,-1.3906,74.3972,-.1018,-2.4885,74.4848,3.8801,-3.381,74.3853,4.5253,-2.9343],
// 4 16 73.9823 -.2012 -.391 74.1851 -.3766 -1.3906 74.3853 4.5253 -2.9343 74.2504 4.9128 -2.2806
  [4,16,73.9823,-.2012,-.391,74.1851,-.3766,-1.3906,74.3853,4.5253,-2.9343,74.2504,4.9128,-2.2806],
// 4 16 73.8215 .3352 .3571 73.9823 -.2012 -.391 74.2504 4.9128 -2.2806 74.0842 5.0497 -1.4431
  [4,16,73.8215,.3352,.3571,73.9823,-.2012,-.391,74.2504,4.9128,-2.2806,74.0842,5.0497,-1.4431],
// 4 16 73.7114 1.1827 .8341 73.8215 .3352 .3571 74.0842 5.0497 -1.4431 73.8822 4.8759 -.3925
  [4,16,73.7114,1.1827,.8341,73.8215,.3352,.3571,74.0842,5.0497,-1.4431,73.8822,4.8759,-.3925],
// 4 16 73.6595 2.2918 .994 73.7114 1.1827 .8341 73.8822 4.8759 -.3925 73.7452 4.3334 .3607
  [4,16,73.6595,2.2918,.994,73.7114,1.1827,.8341,73.8822,4.8759,-.3925,73.7452,4.3334,.3607],
// 3 16 73.6595 2.2918 .994 73.7452 4.3334 .3607 73.6701 3.482 .826
  [3,16,73.6595,2.2918,.994,73.7452,4.3334,.3607,73.6701,3.482,.826],
// 4 16 75.1041 3.0241 -6.3979 75.5865 .015 -8.482 75.5743 3.3047 -8.7944 74.9834 4.8814 -6.0019
  [4,16,75.1041,3.0241,-6.3979,75.5865,.015,-8.482,75.5743,3.3047,-8.7944,74.9834,4.8814,-6.0019],
// 4 16 74.9834 4.8814 -6.0019 75.5743 3.3047 -8.7944 75.6232 4.5758 -9.1846 74.7544 6.2922 -4.9922
  [4,16,74.9834,4.8814,-6.0019,75.5743,3.3047,-8.7944,75.6232,4.5758,-9.1846,74.7544,6.2922,-4.9922],
// 3 16 75.6232 4.5758 -9.1846 75.7094 5.6278 -9.7375 74.7544 6.2922 -4.9922
  [3,16,75.6232,4.5758,-9.1846,75.7094,5.6278,-9.7375,74.7544,6.2922,-4.9922],
// 4 16 74.7544 6.2922 -4.9922 75.7094 5.6278 -9.7375 75.8333 6.4406 -10.4529 74.4358 7.1662 -3.4444
  [4,16,74.7544,6.2922,-4.9922,75.7094,5.6278,-9.7375,75.8333,6.4406,-10.4529,74.4358,7.1662,-3.4444],
// 3 16 75.8333 6.4406 -10.4529 75.9945 7.0342 -11.3308 74.4358 7.1662 -3.4444
  [3,16,75.8333,6.4406,-10.4529,75.9945,7.0342,-11.3308,74.4358,7.1662,-3.4444],
// 4 16 76.25 11 -13.0658 74.4358 7.1662 -3.4444 75.9945 7.0342 -11.3308 76.1936 7.3787 -12.3712
  [4,16,76.25,11,-13.0658,74.4358,7.1662,-3.4444,75.9945,7.0342,-11.3308,76.1936,7.3787,-12.3712],
// 3 16 76.25 -11 -10.5677 76.25 -7.5 -13.6 76.25 -7.38 -12.38
  [3,16,76.25,-11,-10.5677,76.25,-7.5,-13.6,76.25,-7.38,-12.38],
// 3 16 76.25 -11 -10.5677 76.25 -7.38 -12.38 76.25 -7.02 -11.3
  [3,16,76.25,-11,-10.5677,76.25,-7.38,-12.38,76.25,-7.02,-11.3],
// 3 16 76.25 -7.38 -14.85 76.25 -7.5 -13.6 76.25 -11 -10.5677
  [3,16,76.25,-7.38,-14.85,76.25,-7.5,-13.6,76.25,-11,-10.5677],
// 3 16 76.25 -7.04 -15.92 76.25 -7.38 -14.85 76.25 -11 -10.5677
  [3,16,76.25,-7.04,-15.92,76.25,-7.38,-14.85,76.25,-11,-10.5677],
// 4 16 76.25 -7.38 -25.18 76.25 -7.02 -24.1 76.25 -6.45 -16.83 76.25 -7.04 -15.92
  [4,16,76.25,-7.38,-25.18,76.25,-7.02,-24.1,76.25,-6.45,-16.83,76.25,-7.04,-15.92],
// 4 16 76.25 -5.61 -22.45 76.25 -5.63 -17.57 76.25 -6.45 -16.83 76.25 -6.44 -23.2
  [4,16,76.25,-5.61,-22.45,76.25,-5.63,-17.57,76.25,-6.45,-16.83,76.25,-6.44,-23.2],
// 4 16 76.25 -4.55 -21.88 76.25 -4.58 -18.14 76.25 -5.63 -17.57 76.25 -5.61 -22.45
  [4,16,76.25,-4.55,-21.88,76.25,-4.58,-18.14,76.25,-5.63,-17.57,76.25,-5.61,-22.45],
// 4 16 76.25 -3.29 -18.54 76.25 -3.26 -21.46 76.25 -2.22 -21.35 76.25 0 -18.85
  [4,16,76.25,-3.29,-18.54,76.25,-3.26,-21.46,76.25,-2.22,-21.35,76.25,0,-18.85],
// 4 16 76.25 0 -18.85 76.25 -2.22 -21.35 76.25 .03 -21.15 76.25 2.27 -18.65
  [4,16,76.25,0,-18.85,76.25,-2.22,-21.35,76.25,.03,-21.15,76.25,2.27,-18.65],
// 4 16 76.25 2.27 -18.65 76.25 .03 -21.15 76.25 3.32 -21.46 76.25 3.3 -18.54
  [4,16,76.25,2.27,-18.65,76.25,.03,-21.15,76.25,3.32,-21.46,76.25,3.3,-18.54],
// 4 16 76.25 -4.76 -12.6 76.25 -5.06 -13.6 76.25 -4.76 -14.63 76.25 -3.84 -15.32
  [4,16,76.25,-4.76,-12.6,76.25,-5.06,-13.6,76.25,-4.76,-14.63,76.25,-3.84,-15.32],
// 4 16 76.25 -3.84 -11.9 76.25 -4.76 -12.6 76.25 -3.84 -15.32 76.25 -2.28 -15.71
  [4,16,76.25,-3.84,-11.9,76.25,-4.76,-12.6,76.25,-3.84,-15.32,76.25,-2.28,-15.71],
// 4 16 76.25 -2.2876 -11.557 76.25 -3.84 -11.9 76.25 -2.28 -15.71 76.25 0 -15.83
  [4,16,76.25,-2.2876,-11.557,76.25,-3.84,-11.9,76.25,-2.28,-15.71,76.25,0,-15.83],
// 4 16 76.25 4.4203 -12.3187 76.25 -2.2876 -11.557 76.25 0 -15.83 76.25 2.31 -15.71
  [4,16,76.25,4.4203,-12.3187,76.25,-2.2876,-11.557,76.25,0,-15.83,76.25,2.31,-15.71],
// 4 16 76.1819 3.8685 -11.9135 76.1376 2.2975 -11.5124 76.1646 -.0019 -11.387 76.25 -2.2876 -11.557
  [4,16,76.1819,3.8685,-11.9135,76.1376,2.2975,-11.5124,76.1646,-.0019,-11.387,76.25,-2.2876,-11.557],
// 4 16 76.25 4.79 -14.63 76.25 4.4203 -12.3187 76.25 2.31 -15.71 76.25 3.89 -15.32
  [4,16,76.25,4.79,-14.63,76.25,4.4203,-12.3187,76.25,2.31,-15.71,76.25,3.89,-15.32],
// 3 16 76.25 4.4203 -12.3187 76.1819 3.8685 -11.9135 76.25 -2.2876 -11.557
  [3,16,76.25,4.4203,-12.3187,76.1819,3.8685,-11.9135,76.25,-2.2876,-11.557],
// 4 16 76.25 4.79 -14.63 76.25 5.09 -13.6 76.25 4.79 -12.6 76.25 4.4203 -12.3187
  [4,16,76.25,4.79,-14.63,76.25,5.09,-13.6,76.25,4.79,-12.6,76.25,4.4203,-12.3187],
// 4 16 76.25 -4.58 -18.14 76.25 -4.55 -21.88 76.25 -3.26 -21.46 76.25 -3.29 -18.54
  [4,16,76.25,-4.58,-18.14,76.25,-4.55,-21.88,76.25,-3.26,-21.46,76.25,-3.29,-18.54],
// 3 16 76.25 -7.02 -24.1 76.25 -6.44 -23.2 76.25 -6.45 -16.83
  [3,16,76.25,-7.02,-24.1,76.25,-6.44,-23.2,76.25,-6.45,-16.83],
// 4 16 76.25 -7.04 -15.92 76.25 -11 -10.5677 76.25 -7.5 -26.4 76.25 -7.38 -25.18
  [4,16,76.25,-7.04,-15.92,76.25,-11,-10.5677,76.25,-7.5,-26.4,76.25,-7.38,-25.18],
// 4 16 76.25 -7.38 -27.65 76.25 -7.5 -26.4 76.25 -11 -10.5677 76.25 -7.5 -35.34
  [4,16,76.25,-7.38,-27.65,76.25,-7.5,-26.4,76.25,-11,-10.5677,76.25,-7.5,-35.34],
// 3 16 76.25 -7.5 -35.34 76.25 -7.04 -28.72 76.25 -7.38 -27.65
  [3,16,76.25,-7.5,-35.34,76.25,-7.04,-28.72,76.25,-7.38,-27.65],
// 3 16 76.25 -7.5 -35.34 76.25 -6.45 -29.63 76.25 -7.04 -28.72
  [3,16,76.25,-7.5,-35.34,76.25,-6.45,-29.63,76.25,-7.04,-28.72],
// 3 16 76.25 -7.5 -35.34 76.25 -5.63 -30.37 76.25 -6.45 -29.63
  [3,16,76.25,-7.5,-35.34,76.25,-5.63,-30.37,76.25,-6.45,-29.63],
// 3 16 76.25 -7.5 -35.34 76.25 -4.58 -30.94 76.25 -5.63 -30.37
  [3,16,76.25,-7.5,-35.34,76.25,-4.58,-30.94,76.25,-5.63,-30.37],
// 3 16 76.25 -7.5 -35.34 76.25 -3.29 -31.34 76.25 -4.58 -30.94
  [3,16,76.25,-7.5,-35.34,76.25,-3.29,-31.34,76.25,-4.58,-30.94],
// 4 16 76.25 0 -31.65 76.25 -3.29 -31.34 76.25 -7.5 -35.34 76.25 1.71 -35.34
  [4,16,76.25,0,-31.65,76.25,-3.29,-31.34,76.25,-7.5,-35.34,76.25,1.71,-35.34],
// 3 16 76.25 0 -31.65 76.25 1.71 -35.34 76.25 1.71 -33.54
  [3,16,76.25,0,-31.65,76.25,1.71,-35.34,76.25,1.71,-33.54],
// 3 16 76.25 0 -31.65 76.25 1.71 -33.54 76.25 2.27 -31.45
  [3,16,76.25,0,-31.65,76.25,1.71,-33.54,76.25,2.27,-31.45],
// 4 16 76.25 3.3 -31.34 76.25 2.27 -31.45 76.25 1.71 -33.54 76.25 4.16 -33.54
  [4,16,76.25,3.3,-31.34,76.25,2.27,-31.45,76.25,1.71,-33.54,76.25,4.16,-33.54],
// 4 16 76.25 4.59 -30.94 76.25 3.3 -31.34 76.25 4.16 -33.54 76.25 7.5 -35.34
  [4,16,76.25,4.59,-30.94,76.25,3.3,-31.34,76.25,4.16,-33.54,76.25,7.5,-35.34],
// 3 16 76.25 4.16 -33.54 76.25 4.16 -35.34 76.25 7.5 -35.34
  [3,16,76.25,4.16,-33.54,76.25,4.16,-35.34,76.25,7.5,-35.34],
// 3 16 76.25 4.59 -30.94 76.25 7.5 -35.34 76.25 5.64 -30.37
  [3,16,76.25,4.59,-30.94,76.25,7.5,-35.34,76.25,5.64,-30.37],
// 3 16 76.25 5.64 -30.37 76.25 7.5 -35.34 76.25 6.45 -29.63
  [3,16,76.25,5.64,-30.37,76.25,7.5,-35.34,76.25,6.45,-29.63],
// 3 16 76.25 6.45 -29.63 76.25 7.5 -35.34 76.25 7.04 -28.72
  [3,16,76.25,6.45,-29.63,76.25,7.5,-35.34,76.25,7.04,-28.72],
// 4 16 76.25 -4.76 -25.4 76.25 -5.06 -26.4 76.25 -4.76 -27.43 76.25 -3.84 -28.119
  [4,16,76.25,-4.76,-25.4,76.25,-5.06,-26.4,76.25,-4.76,-27.43,76.25,-3.84,-28.119],
// 4 16 76.25 -3.84 -24.7 76.25 -4.76 -25.4 76.25 -3.84 -28.119 76.25 -2.28 -28.51
  [4,16,76.25,-3.84,-24.7,76.25,-4.76,-25.4,76.25,-3.84,-28.119,76.25,-2.28,-28.51],
// 4 16 76.25 -2.28 -24.29 76.25 -3.84 -24.7 76.25 -2.28 -28.51 76.25 0 -28.63
  [4,16,76.25,-2.28,-24.29,76.25,-3.84,-24.7,76.25,-2.28,-28.51,76.25,0,-28.63],
// 4 16 76.25 0 -24.17 76.25 -2.28 -24.29 76.25 0 -28.63 76.25 2.31 -28.51
  [4,16,76.25,0,-24.17,76.25,-2.28,-24.29,76.25,0,-28.63,76.25,2.31,-28.51],
// 4 16 76.25 2.3 -24.29 76.25 0 -24.17 76.25 2.31 -28.51 76.25 3.89 -28.119
  [4,16,76.25,2.3,-24.29,76.25,0,-24.17,76.25,2.31,-28.51,76.25,3.89,-28.119],
// 4 16 76.25 3.87 -24.7 76.25 2.3 -24.29 76.25 3.89 -28.119 76.25 4.79 -27.43
  [4,16,76.25,3.87,-24.7,76.25,2.3,-24.29,76.25,3.89,-28.119,76.25,4.79,-27.43],
// 4 16 76.25 4.79 -25.4 76.25 3.87 -24.7 76.25 4.79 -27.43 76.25 5.09 -26.4
  [4,16,76.25,4.79,-25.4,76.25,3.87,-24.7,76.25,4.79,-27.43,76.25,5.09,-26.4],
// 3 16 76.25 -4.82 -38.31 76.25 1.77 -42.48 76.25 1.77 -38.31
  [3,16,76.25,-4.82,-38.31,76.25,1.77,-42.48,76.25,1.77,-38.31],
// 4 16 76 -11 -10.5677 76 -11 -49 76.25 -11 -49 76.25 -11 -10.5677
  [4,16,76,-11,-10.5677,76,-11,-49,76.25,-11,-49,76.25,-11,-10.5677],
// 4 16 72.2585 -11.0845 8.256 76 -11 -10.5677 76.25 -11 -10.5677 72.5085 -11.0845 8.256
  [4,16,72.2585,-11.0845,8.256,76,-11,-10.5677,76.25,-11,-10.5677,72.5085,-11.0845,8.256],
// 4 16 76.25 11 -49 76 11 -49 76 11 -13.0658 76.25 11 -13.0658
  [4,16,76.25,11,-49,76,11,-49,76,11,-13.0658,76.25,11,-13.0658],
// 4 16 76.25 11 -13.0658 76 11 -13.0658 71.8435 10.9226 8.188 72.0935 10.9226 8.188
  [4,16,76.25,11,-13.0658,76,11,-13.0658,71.8435,10.9226,8.188,72.0935,10.9226,8.188],
// 4 16 71.8435 10.9226 8.188 72.2585 -11.0845 8.256 72.5085 -11.0845 8.256 72.0935 10.9226 8.188
  [4,16,71.8435,10.9226,8.188,72.2585,-11.0845,8.256,72.5085,-11.0845,8.256,72.0935,10.9226,8.188],
// 5 24 76.25 11 -13.0658 76.25 -11 -10.5677 76.25 -11 -49 72.5085 -11.0845 8.256
  [5,24,76.25,11,-13.0658,76.25,-11,-10.5677,76.25,-11,-49,72.5085,-11.0845,8.256],
// 5 24 76 -11 -10.5677 76 11 -13.0658 76 11 -49 71.8435 10.9226 8.188
  [5,24,76,-11,-10.5677,76,11,-13.0658,76,11,-49,71.8435,10.9226,8.188],
];
module ldraw_lib__194175bc01(step=0, col=false, unit=2/5, alt=false, line=0.2, solid=!$preview)
    makepoly(ldraw_lib__194175bc01(), step=step, col=col, unit=unit, alt=alt, line=line, solid=solid);
ldraw_lib__194175bc01(line=0.2);
